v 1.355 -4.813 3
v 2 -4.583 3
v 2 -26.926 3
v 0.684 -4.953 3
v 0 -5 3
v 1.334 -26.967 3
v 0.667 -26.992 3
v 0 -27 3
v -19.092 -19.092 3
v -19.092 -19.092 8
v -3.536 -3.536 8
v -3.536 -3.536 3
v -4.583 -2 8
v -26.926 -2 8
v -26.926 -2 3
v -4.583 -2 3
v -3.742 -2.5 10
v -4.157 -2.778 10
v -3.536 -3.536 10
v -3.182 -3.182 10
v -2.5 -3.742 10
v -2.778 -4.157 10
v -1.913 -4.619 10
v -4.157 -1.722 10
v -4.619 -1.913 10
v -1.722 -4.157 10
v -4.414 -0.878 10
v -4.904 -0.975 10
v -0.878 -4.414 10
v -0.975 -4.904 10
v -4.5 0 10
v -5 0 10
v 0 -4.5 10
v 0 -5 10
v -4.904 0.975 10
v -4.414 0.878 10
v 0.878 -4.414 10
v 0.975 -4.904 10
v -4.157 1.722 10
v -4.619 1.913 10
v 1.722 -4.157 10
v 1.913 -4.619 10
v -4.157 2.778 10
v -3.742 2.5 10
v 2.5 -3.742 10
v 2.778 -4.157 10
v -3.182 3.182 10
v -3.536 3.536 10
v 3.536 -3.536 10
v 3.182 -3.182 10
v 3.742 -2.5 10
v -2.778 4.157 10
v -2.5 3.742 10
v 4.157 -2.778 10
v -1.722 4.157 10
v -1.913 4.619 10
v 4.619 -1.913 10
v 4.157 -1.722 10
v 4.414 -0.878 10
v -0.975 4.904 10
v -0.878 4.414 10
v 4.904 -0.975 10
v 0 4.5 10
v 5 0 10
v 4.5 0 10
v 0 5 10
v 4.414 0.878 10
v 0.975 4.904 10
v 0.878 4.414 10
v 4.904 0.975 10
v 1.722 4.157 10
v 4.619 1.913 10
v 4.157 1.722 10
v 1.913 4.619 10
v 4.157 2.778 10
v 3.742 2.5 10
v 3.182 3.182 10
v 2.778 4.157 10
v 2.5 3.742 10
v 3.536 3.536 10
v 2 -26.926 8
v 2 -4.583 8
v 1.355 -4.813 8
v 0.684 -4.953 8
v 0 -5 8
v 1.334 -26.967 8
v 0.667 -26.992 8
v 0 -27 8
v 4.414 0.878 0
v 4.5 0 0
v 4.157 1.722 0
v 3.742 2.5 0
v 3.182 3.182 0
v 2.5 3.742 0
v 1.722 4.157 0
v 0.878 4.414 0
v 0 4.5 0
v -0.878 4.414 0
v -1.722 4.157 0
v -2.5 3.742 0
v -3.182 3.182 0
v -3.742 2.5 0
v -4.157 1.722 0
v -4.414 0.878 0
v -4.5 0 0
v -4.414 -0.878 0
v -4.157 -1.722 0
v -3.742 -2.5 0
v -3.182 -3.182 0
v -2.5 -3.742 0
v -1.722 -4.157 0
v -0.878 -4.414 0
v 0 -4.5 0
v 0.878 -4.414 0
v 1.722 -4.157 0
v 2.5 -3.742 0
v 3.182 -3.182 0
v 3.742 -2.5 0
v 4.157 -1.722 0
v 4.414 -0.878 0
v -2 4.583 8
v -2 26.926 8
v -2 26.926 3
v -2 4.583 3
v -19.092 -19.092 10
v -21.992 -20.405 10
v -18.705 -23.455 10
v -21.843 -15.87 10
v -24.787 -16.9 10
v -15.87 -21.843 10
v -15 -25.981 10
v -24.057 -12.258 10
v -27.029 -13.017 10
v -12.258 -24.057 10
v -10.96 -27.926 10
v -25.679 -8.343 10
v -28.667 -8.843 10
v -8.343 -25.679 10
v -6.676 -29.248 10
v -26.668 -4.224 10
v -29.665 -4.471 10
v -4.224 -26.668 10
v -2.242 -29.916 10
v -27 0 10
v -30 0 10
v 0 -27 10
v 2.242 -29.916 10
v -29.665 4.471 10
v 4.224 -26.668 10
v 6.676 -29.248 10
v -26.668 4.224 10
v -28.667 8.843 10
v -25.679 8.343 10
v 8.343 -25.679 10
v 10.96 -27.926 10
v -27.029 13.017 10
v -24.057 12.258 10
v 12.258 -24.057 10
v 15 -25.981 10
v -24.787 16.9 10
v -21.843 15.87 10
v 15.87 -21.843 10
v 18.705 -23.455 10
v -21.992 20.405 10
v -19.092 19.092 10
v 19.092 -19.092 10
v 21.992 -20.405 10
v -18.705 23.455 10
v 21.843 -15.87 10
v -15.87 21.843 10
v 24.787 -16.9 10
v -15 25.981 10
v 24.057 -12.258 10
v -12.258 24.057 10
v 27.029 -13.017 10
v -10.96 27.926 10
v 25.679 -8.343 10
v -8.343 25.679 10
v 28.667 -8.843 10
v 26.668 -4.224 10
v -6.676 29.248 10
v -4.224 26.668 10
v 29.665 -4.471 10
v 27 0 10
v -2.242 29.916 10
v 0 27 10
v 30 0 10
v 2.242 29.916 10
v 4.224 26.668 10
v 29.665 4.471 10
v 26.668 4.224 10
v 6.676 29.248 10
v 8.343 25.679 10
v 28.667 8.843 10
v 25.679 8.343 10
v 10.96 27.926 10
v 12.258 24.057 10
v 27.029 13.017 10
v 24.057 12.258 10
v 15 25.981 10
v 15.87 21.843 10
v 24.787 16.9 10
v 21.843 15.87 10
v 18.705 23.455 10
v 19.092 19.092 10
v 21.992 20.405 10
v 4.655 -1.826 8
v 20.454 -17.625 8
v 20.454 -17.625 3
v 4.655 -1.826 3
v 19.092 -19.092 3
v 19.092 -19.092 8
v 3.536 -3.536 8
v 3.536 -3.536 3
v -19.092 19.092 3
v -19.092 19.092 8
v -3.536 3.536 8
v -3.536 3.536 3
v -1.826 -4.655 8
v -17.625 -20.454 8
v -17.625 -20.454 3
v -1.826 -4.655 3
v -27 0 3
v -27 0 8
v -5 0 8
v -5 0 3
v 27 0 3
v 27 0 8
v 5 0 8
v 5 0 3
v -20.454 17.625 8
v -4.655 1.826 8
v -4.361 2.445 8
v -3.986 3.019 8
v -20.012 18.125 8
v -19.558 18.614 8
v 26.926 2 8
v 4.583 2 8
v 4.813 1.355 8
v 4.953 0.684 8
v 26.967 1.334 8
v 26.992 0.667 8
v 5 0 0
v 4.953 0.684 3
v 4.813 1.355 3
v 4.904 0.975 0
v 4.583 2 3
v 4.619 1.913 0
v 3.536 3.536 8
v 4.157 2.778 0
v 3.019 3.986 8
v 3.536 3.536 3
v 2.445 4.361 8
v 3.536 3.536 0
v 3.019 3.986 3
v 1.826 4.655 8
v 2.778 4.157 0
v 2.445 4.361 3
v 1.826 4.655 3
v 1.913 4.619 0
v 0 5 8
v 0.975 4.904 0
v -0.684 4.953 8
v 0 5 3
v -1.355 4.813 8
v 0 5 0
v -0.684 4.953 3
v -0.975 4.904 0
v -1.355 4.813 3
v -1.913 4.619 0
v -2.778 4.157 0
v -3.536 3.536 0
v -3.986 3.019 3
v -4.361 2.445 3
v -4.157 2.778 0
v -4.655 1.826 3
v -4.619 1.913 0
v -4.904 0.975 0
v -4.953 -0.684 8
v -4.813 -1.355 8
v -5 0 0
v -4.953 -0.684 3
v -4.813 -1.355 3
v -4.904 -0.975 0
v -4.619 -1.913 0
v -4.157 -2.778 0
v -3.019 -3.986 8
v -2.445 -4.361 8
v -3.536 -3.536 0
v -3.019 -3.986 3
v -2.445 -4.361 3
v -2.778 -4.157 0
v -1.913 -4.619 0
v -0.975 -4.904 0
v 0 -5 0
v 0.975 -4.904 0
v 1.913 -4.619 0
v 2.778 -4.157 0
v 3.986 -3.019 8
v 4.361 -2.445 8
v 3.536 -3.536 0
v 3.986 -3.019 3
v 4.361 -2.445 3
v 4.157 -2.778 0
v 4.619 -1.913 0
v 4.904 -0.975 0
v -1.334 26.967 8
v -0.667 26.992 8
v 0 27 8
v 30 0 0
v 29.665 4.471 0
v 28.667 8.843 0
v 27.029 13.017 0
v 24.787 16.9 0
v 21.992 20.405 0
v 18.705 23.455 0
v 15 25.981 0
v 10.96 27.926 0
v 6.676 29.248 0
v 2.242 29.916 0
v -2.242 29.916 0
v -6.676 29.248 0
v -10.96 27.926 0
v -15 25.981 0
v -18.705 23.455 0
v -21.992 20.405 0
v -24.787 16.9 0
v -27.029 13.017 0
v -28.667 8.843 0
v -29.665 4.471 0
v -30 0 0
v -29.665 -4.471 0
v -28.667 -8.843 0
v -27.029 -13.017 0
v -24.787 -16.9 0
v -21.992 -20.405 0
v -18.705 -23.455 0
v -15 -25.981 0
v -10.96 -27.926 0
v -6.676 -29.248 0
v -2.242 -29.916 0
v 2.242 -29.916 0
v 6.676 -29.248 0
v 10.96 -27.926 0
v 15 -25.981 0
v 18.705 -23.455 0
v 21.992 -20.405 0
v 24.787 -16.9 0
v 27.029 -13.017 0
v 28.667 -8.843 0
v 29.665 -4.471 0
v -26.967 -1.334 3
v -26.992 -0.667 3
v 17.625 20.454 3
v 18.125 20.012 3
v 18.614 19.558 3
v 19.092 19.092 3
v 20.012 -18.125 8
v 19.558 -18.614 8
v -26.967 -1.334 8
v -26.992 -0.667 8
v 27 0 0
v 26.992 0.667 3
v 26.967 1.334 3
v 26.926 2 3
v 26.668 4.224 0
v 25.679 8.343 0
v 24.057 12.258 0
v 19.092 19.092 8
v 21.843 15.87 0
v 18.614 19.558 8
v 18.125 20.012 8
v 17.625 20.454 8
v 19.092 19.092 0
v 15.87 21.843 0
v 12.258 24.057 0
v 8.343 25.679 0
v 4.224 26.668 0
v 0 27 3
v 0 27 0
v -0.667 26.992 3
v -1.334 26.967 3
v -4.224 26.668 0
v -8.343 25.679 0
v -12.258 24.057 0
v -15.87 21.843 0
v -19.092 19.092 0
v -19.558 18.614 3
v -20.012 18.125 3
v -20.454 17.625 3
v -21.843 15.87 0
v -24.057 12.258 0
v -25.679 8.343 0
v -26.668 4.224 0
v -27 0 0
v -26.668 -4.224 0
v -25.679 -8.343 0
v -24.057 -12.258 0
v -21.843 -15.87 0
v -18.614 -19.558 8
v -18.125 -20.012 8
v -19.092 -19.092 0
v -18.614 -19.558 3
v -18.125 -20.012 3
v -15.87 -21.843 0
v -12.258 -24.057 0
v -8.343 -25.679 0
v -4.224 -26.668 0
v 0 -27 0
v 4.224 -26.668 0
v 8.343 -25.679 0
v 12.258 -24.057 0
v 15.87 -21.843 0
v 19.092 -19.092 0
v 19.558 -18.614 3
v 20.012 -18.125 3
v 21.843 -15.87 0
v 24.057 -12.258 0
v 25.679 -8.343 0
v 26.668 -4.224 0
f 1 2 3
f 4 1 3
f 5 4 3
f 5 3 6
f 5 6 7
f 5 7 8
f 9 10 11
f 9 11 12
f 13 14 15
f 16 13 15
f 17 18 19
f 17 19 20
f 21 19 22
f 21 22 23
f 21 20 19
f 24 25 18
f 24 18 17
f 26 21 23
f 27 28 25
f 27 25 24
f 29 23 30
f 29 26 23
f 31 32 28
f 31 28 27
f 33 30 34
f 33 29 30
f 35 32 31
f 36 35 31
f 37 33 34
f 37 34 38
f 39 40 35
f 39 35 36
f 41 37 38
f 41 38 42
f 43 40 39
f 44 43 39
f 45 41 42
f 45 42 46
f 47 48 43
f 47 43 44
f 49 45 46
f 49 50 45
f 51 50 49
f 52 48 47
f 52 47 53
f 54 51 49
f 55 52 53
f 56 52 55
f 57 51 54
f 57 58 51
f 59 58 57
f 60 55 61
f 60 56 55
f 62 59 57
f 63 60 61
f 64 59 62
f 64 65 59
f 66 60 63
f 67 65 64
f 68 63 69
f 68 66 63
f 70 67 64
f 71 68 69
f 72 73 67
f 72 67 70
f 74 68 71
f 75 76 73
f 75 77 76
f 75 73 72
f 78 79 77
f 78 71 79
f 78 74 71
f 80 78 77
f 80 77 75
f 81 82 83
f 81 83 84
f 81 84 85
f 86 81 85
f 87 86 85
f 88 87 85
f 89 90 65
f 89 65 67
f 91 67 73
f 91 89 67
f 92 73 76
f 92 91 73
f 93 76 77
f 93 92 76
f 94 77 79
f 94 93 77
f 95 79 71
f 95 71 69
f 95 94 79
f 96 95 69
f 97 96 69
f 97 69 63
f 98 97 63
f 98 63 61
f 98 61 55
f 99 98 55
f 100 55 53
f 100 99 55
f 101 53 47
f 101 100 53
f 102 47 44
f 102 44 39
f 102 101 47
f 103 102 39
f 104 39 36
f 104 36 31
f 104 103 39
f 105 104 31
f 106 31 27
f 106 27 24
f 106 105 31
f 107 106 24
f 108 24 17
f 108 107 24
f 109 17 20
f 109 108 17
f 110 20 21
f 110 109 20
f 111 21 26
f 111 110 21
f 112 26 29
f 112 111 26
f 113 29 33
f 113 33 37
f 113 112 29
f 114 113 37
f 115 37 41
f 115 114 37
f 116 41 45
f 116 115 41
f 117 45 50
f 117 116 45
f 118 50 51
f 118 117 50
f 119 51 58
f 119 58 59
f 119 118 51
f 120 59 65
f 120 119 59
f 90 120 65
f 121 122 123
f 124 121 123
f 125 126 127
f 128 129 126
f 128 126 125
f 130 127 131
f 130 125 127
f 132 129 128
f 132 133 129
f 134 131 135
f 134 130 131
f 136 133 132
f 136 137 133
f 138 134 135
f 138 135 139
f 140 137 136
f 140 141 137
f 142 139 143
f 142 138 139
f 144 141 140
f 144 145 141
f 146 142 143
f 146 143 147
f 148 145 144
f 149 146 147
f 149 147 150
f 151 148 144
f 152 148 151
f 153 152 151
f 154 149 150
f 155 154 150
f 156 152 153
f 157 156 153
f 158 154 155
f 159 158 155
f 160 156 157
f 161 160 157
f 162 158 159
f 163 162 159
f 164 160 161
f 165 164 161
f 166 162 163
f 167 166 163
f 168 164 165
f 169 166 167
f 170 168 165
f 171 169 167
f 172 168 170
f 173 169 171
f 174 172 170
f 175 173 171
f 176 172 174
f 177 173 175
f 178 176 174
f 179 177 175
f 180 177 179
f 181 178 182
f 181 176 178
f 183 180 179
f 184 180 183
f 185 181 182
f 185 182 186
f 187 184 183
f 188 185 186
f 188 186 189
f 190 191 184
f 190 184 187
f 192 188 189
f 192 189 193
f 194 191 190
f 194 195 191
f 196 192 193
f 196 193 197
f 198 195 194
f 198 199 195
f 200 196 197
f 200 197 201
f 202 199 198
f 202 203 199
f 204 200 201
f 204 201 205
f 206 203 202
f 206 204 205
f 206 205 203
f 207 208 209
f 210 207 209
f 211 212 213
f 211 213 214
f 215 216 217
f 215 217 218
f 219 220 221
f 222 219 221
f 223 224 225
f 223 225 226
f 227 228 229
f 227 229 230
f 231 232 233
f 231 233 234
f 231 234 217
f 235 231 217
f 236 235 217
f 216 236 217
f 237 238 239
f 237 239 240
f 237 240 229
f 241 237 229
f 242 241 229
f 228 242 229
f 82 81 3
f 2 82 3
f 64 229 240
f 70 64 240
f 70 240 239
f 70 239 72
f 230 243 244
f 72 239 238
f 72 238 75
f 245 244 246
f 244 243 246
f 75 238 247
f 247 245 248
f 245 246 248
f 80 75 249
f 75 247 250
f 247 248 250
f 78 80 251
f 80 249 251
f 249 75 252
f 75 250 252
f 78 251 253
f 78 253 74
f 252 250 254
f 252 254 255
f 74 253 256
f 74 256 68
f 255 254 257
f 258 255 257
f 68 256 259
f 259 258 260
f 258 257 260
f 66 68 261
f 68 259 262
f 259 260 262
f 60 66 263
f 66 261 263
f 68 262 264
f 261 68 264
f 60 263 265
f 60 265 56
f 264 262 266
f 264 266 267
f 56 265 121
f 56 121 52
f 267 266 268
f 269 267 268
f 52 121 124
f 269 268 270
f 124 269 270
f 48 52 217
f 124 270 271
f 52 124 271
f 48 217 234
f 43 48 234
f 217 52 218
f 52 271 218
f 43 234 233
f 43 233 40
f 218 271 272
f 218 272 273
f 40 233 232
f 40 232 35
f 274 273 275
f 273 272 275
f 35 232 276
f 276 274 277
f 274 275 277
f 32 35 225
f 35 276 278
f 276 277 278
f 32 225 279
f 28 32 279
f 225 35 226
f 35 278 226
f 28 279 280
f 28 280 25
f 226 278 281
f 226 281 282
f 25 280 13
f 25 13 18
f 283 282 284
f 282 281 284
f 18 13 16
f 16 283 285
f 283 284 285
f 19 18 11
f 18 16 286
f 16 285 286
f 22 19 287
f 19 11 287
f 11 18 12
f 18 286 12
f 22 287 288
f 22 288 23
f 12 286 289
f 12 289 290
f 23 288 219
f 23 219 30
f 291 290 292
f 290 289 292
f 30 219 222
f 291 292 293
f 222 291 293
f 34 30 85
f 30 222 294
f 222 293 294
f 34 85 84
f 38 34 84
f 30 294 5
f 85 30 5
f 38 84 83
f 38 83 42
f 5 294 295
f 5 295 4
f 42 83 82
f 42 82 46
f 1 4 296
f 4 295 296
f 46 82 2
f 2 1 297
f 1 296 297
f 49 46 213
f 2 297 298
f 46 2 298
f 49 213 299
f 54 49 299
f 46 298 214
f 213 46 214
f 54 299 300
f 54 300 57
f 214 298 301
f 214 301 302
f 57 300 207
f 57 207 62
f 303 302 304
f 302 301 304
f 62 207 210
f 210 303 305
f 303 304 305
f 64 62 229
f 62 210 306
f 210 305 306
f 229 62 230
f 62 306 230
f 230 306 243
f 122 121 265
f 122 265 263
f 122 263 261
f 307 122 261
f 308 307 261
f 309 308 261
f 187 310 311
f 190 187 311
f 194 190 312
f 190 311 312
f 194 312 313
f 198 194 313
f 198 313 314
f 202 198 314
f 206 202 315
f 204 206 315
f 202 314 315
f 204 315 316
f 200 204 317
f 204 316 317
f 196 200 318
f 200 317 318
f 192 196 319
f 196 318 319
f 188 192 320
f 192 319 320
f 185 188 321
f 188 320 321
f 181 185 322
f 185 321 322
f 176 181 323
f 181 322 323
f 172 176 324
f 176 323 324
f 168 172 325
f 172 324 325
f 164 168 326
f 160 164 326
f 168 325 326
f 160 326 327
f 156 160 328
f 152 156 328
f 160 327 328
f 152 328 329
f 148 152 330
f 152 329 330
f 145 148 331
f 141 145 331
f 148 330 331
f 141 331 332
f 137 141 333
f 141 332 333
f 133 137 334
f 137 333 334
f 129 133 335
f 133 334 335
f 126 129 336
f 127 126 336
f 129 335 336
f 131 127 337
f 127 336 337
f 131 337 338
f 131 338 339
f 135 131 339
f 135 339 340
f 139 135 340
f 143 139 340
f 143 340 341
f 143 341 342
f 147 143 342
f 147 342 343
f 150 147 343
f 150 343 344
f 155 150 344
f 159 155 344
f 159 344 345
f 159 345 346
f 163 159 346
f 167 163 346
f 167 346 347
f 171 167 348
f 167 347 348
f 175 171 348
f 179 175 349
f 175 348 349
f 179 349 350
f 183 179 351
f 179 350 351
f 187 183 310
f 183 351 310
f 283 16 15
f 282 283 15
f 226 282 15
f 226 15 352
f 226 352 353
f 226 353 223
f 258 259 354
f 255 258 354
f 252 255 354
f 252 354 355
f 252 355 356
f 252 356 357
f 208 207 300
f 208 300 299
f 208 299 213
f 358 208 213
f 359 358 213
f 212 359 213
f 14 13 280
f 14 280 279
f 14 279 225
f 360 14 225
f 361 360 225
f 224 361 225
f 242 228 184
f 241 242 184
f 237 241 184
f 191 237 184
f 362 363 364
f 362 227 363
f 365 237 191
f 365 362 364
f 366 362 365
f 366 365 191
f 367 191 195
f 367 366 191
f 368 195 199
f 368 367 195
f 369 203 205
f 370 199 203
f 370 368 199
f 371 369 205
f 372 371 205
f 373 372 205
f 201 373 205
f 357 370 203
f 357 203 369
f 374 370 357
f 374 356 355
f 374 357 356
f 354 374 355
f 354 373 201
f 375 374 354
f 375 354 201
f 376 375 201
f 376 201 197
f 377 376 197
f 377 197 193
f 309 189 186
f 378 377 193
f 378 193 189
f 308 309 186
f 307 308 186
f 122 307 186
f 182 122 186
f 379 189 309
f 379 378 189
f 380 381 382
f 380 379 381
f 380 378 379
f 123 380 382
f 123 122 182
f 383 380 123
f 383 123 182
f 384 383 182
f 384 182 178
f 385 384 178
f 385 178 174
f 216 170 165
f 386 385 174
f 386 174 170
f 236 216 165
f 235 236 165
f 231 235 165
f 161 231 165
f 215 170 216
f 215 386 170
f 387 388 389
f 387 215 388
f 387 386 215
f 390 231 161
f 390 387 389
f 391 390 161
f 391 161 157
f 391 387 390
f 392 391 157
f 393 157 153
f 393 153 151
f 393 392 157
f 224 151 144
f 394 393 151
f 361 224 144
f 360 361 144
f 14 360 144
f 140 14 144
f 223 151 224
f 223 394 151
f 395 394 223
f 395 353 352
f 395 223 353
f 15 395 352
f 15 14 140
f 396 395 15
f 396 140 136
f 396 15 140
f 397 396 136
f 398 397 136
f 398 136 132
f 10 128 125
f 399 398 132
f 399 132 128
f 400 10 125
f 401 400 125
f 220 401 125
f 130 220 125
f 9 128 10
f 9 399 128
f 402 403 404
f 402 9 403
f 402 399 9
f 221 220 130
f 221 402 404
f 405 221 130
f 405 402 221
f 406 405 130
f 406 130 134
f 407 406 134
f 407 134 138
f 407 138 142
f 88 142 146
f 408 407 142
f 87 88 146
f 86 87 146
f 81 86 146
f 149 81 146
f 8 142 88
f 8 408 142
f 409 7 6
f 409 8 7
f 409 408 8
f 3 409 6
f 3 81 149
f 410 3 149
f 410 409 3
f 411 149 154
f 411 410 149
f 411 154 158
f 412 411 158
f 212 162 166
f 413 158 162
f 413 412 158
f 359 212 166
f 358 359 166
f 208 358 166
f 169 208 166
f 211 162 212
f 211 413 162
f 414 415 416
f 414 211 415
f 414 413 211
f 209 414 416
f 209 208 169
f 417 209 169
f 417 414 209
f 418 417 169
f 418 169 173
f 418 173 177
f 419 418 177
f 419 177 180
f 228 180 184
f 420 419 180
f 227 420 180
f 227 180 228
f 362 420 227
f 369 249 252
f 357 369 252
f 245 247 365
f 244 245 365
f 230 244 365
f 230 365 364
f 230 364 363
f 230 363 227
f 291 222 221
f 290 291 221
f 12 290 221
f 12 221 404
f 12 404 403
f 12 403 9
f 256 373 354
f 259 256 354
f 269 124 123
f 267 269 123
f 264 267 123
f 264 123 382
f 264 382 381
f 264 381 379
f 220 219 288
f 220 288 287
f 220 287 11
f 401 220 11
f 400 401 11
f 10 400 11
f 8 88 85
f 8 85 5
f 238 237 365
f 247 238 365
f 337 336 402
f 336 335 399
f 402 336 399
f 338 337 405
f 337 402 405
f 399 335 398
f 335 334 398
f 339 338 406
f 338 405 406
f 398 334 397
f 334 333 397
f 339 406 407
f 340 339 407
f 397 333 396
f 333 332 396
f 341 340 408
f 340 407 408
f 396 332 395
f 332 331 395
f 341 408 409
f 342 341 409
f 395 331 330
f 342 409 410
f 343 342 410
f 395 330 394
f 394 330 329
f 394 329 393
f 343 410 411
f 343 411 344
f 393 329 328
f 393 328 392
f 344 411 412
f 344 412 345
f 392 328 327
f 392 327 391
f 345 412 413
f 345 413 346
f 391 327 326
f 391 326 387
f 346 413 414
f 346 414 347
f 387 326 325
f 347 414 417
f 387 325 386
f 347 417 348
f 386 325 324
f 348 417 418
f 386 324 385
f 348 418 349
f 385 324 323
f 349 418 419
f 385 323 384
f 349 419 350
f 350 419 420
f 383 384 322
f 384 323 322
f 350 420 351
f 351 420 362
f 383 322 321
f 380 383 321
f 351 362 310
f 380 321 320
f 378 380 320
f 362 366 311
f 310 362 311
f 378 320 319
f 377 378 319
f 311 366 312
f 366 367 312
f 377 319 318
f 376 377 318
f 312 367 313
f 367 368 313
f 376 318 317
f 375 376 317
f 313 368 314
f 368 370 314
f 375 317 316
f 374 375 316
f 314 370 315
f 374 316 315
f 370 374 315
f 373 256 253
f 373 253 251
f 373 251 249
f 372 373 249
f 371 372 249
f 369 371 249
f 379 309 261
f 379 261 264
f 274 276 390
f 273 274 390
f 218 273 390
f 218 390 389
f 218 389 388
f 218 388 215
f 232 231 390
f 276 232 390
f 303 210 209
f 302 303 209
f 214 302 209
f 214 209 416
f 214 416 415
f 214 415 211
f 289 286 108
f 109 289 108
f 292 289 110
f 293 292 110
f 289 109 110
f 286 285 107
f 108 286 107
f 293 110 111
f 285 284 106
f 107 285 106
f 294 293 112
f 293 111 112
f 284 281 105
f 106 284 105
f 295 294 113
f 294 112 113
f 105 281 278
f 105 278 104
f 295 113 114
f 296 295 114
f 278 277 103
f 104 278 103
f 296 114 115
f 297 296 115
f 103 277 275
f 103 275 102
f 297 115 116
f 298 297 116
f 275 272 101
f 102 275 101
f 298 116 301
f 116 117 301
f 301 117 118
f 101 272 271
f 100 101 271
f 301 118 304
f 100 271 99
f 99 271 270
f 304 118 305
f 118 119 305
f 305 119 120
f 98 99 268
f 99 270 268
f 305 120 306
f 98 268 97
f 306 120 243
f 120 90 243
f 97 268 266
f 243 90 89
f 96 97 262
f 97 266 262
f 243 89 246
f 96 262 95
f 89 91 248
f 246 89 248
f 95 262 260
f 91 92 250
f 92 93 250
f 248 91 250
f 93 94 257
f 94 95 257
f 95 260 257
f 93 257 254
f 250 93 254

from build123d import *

# Parameters (mm, degrees)
SKETCH2_R             = 30
SKETCH2_R_2           = 27
BOSS_EXTRUDE1_DEPTH   = 10
SKETCH2_R_3           = 5
SKETCH2_R_4           = 4.5
BOSS_EXTRUDE1_2_DEPTH = 10
BOSS_EXTRUDE2_START   = -9
SKETCH4_W             = 5
SKETCH4_H             = 2
BOSS_EXTRUDE2_DEPTH   = 22.417424
CIRPATTERN1_COUNT     = 8


with BuildPart() as part:
    # Sketch2 → Boss-Extrude1 (new body)
    with BuildSketch(Plane.XY):
        Circle(SKETCH2_R)
        Circle(SKETCH2_R_2, mode=Mode.SUBTRACT)
    extrude(amount=BOSS_EXTRUDE1_DEPTH)



with BuildPart() as body_2:
    # Sketch2 → Boss-Extrude1 2 (new body)
    with BuildSketch(Plane.XY):
        Circle(SKETCH2_R_3)
        Circle(SKETCH2_R_4, mode=Mode.SUBTRACT)
    extrude(amount=BOSS_EXTRUDE1_2_DEPTH)


with BuildPart() as part_1:
    add(part.part)

    add(body_2.part)  # Boss-Extrude2 merges body 2
    # Sketch4 → Boss-Extrude2 (add)
    with BuildSketch(Plane(origin=(-18, 0, 0), x_dir=(0, 0, -1), z_dir=(1, 0, 0)).offset(BOSS_EXTRUDE2_START)):
        with Locations((-5.5, -1)):
            Rectangle(SKETCH4_W, SKETCH4_H)
    boss_extrude2 = extrude(amount=BOSS_EXTRUDE2_DEPTH)

    # CirPattern1: Boss-Extrude2 ×8 about axis
    cirpattern1_axis = Axis((0, 0, 0), (0, 0, 1))
    for i in range(1, CIRPATTERN1_COUNT):
        add(boss_extrude2.rotate(cirpattern1_axis, i * 360 / CIRPATTERN1_COUNT))


solid = part_1.part
